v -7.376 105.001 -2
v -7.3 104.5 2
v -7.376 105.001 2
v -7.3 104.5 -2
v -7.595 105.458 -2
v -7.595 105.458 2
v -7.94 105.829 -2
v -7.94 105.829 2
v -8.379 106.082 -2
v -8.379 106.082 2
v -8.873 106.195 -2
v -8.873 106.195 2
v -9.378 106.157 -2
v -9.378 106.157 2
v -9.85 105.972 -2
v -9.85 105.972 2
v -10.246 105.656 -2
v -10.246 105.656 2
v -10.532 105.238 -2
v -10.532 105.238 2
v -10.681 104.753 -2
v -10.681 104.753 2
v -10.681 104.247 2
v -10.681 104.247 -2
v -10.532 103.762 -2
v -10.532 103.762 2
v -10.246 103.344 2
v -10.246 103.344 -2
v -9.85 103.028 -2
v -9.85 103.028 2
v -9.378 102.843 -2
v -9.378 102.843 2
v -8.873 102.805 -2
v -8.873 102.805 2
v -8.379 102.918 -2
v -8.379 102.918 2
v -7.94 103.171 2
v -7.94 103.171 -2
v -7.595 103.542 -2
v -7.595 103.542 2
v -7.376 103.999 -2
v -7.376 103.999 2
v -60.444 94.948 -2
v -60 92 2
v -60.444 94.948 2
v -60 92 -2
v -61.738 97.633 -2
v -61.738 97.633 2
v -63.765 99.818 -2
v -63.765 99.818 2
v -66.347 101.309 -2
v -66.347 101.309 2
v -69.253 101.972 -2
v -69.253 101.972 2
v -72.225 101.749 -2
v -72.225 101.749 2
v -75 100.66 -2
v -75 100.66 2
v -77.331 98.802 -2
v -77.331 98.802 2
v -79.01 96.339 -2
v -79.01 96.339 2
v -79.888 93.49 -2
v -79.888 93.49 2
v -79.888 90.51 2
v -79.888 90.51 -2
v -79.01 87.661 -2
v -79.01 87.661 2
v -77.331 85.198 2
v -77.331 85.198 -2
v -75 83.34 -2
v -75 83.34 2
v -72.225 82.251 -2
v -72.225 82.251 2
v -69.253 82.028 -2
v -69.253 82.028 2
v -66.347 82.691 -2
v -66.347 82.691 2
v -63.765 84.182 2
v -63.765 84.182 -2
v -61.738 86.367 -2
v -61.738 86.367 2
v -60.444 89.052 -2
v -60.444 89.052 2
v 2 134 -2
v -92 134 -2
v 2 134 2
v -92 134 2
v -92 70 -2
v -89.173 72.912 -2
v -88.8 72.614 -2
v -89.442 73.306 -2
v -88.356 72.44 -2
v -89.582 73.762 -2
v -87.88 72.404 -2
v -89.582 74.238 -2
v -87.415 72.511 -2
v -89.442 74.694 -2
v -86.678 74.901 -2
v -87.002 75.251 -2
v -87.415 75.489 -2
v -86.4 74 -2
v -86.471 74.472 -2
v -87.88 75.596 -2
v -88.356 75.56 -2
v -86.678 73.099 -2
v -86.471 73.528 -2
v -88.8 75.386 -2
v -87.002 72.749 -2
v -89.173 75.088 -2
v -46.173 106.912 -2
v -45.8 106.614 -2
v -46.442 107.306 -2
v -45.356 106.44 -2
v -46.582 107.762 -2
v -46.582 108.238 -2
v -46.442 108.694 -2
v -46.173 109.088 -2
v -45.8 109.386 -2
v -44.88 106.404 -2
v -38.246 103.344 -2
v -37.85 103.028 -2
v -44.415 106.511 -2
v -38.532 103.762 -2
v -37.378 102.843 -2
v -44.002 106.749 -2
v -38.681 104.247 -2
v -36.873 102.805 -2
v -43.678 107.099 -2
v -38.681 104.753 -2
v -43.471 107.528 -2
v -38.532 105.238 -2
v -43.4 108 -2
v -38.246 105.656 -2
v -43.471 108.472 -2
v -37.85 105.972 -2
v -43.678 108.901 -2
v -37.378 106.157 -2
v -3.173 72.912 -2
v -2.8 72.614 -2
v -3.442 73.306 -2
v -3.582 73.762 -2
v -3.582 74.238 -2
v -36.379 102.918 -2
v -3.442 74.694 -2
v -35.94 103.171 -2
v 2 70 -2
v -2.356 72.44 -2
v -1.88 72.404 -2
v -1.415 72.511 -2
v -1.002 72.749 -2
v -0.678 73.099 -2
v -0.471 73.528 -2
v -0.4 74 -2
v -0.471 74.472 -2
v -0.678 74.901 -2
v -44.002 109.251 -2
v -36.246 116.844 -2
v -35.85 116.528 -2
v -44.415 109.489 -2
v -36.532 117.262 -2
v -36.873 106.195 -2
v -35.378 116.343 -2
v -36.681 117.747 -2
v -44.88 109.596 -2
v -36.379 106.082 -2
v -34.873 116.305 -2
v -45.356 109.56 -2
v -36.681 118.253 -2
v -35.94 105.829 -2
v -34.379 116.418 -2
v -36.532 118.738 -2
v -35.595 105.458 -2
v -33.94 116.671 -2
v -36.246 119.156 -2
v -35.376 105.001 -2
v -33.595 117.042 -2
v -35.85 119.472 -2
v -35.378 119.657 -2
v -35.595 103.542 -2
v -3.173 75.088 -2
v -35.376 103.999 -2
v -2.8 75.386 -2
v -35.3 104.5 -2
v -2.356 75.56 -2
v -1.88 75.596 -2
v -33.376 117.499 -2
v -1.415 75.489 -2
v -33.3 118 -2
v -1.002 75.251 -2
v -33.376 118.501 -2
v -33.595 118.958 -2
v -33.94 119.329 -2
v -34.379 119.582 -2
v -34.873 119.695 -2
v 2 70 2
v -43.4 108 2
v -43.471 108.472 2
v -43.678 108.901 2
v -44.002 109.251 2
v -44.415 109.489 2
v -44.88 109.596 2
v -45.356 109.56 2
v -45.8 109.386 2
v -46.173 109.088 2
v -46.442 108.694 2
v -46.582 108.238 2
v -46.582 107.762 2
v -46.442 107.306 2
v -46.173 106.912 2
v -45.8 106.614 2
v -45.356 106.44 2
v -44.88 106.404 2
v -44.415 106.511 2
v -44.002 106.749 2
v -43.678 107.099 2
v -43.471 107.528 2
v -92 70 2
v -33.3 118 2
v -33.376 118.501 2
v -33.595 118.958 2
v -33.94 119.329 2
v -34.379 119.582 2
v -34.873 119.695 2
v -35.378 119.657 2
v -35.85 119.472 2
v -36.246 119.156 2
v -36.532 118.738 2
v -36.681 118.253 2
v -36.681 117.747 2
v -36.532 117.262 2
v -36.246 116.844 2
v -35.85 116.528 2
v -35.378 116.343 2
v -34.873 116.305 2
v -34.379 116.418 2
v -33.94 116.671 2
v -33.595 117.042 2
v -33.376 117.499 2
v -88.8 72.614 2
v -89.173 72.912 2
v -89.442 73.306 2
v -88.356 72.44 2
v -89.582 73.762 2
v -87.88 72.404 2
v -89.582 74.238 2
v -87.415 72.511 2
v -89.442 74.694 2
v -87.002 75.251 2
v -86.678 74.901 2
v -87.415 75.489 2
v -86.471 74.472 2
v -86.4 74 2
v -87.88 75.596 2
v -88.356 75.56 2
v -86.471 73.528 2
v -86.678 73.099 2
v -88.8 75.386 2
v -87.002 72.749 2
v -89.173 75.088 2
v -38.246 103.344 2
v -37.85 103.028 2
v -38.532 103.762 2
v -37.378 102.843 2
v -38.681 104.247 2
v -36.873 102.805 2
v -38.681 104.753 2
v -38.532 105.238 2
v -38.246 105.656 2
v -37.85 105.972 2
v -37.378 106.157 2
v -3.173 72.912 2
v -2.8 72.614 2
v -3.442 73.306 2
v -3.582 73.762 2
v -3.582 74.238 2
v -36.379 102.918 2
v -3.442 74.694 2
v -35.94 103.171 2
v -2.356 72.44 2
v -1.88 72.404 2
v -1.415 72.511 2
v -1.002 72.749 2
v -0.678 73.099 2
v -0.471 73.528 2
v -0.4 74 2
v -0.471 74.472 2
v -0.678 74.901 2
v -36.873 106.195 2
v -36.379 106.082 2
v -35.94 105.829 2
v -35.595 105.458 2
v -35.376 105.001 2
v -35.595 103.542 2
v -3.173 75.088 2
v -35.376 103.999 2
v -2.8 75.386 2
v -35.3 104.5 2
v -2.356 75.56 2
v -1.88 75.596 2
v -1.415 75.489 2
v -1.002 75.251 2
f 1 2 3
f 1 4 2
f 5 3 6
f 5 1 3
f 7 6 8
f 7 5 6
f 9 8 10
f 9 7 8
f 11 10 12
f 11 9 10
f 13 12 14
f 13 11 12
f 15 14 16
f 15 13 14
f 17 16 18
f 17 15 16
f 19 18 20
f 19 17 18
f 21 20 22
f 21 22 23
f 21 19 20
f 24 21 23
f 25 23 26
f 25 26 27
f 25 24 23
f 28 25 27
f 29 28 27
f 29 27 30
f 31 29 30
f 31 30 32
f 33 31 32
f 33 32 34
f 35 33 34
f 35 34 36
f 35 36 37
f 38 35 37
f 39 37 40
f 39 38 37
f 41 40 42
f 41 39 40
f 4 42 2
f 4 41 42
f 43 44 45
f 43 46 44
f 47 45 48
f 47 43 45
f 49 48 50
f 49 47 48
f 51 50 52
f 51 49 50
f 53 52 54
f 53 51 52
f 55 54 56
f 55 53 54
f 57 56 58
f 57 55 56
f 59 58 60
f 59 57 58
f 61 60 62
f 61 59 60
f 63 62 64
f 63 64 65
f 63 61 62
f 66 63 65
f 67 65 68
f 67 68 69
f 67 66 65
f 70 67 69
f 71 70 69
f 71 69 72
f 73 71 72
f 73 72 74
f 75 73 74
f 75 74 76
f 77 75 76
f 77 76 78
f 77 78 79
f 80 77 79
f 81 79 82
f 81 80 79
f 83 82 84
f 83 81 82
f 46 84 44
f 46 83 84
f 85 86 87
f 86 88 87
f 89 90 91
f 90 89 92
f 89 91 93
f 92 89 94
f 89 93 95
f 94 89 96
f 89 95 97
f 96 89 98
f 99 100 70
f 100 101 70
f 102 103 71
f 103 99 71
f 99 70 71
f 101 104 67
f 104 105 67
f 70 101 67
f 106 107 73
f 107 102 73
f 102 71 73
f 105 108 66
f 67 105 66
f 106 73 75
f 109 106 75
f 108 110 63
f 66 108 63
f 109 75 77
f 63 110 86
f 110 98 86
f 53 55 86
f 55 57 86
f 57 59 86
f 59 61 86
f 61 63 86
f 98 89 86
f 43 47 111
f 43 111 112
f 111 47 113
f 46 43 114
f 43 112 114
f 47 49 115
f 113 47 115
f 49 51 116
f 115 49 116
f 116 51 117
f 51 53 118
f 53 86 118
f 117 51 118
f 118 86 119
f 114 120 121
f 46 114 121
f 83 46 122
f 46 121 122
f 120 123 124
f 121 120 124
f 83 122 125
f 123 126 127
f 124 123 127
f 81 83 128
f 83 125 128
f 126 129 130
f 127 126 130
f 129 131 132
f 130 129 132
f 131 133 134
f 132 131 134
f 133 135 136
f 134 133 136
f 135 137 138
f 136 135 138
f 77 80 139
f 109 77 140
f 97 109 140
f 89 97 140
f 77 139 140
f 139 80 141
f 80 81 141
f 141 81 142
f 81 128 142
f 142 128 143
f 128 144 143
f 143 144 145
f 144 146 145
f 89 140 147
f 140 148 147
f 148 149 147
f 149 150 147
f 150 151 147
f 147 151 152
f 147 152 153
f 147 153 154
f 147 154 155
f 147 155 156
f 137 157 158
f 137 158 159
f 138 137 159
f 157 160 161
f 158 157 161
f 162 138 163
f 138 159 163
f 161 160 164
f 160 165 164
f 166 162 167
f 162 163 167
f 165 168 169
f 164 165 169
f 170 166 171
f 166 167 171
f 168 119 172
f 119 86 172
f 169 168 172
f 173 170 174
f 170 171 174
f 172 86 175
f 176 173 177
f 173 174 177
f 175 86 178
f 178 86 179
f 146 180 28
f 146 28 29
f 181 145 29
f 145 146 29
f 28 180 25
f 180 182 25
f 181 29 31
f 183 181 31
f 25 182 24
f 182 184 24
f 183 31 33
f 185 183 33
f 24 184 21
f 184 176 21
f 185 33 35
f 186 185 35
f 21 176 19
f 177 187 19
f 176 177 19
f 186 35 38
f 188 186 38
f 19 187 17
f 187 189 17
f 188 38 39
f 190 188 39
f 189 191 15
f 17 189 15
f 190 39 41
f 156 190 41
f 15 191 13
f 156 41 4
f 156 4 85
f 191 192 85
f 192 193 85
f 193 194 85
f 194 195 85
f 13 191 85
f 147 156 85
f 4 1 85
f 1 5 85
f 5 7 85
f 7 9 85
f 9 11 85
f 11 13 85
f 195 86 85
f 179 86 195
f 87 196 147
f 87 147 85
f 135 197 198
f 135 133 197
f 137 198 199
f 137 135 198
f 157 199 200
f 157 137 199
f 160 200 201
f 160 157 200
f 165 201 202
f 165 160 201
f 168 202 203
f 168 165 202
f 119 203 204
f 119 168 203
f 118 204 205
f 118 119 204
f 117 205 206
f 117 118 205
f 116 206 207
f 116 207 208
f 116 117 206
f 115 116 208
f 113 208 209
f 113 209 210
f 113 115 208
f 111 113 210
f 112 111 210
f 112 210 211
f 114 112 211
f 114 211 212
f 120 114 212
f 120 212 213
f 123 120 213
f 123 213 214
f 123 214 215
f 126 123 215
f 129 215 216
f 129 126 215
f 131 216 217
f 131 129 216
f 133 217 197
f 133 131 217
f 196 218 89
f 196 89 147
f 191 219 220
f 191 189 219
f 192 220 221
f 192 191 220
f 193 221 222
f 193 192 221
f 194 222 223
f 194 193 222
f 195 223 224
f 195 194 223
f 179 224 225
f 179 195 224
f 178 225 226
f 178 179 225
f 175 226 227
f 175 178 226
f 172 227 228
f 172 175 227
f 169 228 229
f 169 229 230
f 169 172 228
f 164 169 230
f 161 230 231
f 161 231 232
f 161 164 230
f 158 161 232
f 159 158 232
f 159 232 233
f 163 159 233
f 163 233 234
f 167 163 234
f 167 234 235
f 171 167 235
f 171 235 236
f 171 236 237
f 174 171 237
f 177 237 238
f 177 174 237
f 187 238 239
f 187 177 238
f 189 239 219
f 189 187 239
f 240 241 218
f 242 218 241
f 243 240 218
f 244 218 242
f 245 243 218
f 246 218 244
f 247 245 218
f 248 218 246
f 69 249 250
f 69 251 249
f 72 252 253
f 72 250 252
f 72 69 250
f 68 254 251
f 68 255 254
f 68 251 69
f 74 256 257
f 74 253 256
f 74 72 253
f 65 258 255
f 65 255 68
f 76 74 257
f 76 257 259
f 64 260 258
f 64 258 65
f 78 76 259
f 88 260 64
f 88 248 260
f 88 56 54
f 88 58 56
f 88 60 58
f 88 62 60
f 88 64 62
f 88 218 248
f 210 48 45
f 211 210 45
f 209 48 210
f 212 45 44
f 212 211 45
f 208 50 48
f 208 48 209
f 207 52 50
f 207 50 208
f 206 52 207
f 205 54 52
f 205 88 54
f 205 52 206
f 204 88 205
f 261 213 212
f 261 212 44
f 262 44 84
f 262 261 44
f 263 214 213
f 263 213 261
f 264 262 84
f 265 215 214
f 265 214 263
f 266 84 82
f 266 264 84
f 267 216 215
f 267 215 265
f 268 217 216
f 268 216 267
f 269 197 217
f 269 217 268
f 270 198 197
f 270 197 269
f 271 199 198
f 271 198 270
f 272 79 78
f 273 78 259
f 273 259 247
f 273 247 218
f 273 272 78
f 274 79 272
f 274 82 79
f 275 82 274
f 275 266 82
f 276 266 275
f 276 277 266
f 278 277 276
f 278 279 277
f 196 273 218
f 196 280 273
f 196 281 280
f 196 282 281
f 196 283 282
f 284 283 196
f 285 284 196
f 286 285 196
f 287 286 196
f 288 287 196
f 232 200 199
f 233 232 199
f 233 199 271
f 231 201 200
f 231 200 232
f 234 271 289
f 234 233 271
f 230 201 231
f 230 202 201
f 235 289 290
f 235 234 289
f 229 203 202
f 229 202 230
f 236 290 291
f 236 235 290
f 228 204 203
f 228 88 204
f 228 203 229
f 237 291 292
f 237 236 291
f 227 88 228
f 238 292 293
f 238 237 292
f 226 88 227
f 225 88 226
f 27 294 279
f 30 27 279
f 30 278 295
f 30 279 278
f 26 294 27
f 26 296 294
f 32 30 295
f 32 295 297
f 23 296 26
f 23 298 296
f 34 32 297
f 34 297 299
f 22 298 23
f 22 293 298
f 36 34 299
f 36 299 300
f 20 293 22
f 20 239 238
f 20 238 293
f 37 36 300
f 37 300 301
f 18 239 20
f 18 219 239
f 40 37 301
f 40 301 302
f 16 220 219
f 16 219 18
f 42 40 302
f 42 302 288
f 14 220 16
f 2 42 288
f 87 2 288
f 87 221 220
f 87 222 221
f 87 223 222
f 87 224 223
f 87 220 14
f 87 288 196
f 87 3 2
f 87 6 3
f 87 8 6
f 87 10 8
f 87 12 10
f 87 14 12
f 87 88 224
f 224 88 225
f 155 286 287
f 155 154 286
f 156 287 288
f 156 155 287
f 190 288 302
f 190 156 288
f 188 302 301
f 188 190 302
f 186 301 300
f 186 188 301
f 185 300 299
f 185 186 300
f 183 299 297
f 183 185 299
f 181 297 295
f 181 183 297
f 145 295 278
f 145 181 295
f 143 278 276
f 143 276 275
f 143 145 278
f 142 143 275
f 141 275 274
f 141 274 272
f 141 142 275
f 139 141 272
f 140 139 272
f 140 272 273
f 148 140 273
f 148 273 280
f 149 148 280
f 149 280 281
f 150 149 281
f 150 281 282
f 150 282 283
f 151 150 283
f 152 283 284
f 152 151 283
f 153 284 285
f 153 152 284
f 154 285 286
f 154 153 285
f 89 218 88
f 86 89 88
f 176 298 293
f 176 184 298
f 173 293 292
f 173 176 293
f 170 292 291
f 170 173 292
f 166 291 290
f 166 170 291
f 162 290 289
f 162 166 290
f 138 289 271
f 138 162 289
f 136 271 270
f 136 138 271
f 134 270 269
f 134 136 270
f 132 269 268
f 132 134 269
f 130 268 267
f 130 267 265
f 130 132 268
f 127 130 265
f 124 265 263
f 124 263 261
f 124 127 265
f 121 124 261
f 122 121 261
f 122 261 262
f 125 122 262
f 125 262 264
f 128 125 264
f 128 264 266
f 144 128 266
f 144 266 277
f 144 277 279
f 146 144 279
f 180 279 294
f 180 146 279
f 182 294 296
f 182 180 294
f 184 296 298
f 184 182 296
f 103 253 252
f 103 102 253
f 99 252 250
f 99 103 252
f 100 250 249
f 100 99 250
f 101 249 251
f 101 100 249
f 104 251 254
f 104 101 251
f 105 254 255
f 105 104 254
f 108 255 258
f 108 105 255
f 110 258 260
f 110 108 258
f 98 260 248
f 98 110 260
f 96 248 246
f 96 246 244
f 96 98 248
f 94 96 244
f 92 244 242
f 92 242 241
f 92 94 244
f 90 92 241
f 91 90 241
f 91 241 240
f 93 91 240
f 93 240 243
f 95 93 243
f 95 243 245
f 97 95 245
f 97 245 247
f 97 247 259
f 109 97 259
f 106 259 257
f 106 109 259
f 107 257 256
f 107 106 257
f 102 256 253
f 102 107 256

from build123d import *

# Parameters (mm, degrees)
SKETCH_1_W      = 94
SKETCH_1_H      = 64
SKETCH_1_R      = 10
SKETCH_1_R_2    = 1.7
SKETCH_1_R_3    = 1.6
EXTRUDE_1_DEPTH = 2


with BuildPart() as part:
    # 草图1 → 凸台-拉伸1 (new, symmetric)
    with BuildSketch(Plane.XY):
        with Locations((-45, 102)):
            Rectangle(SKETCH_1_W, SKETCH_1_H)
        with Locations((-70, 92)):
            Circle(SKETCH_1_R, mode=Mode.SUBTRACT)
        with Locations((-35, 118)):
            Circle(SKETCH_1_R_2, mode=Mode.SUBTRACT)
        with Locations((-9, 104.5)):
            Circle(SKETCH_1_R_2, mode=Mode.SUBTRACT)
        with Locations((-37, 104.5)):
            Circle(SKETCH_1_R_2, mode=Mode.SUBTRACT)
        with Locations((-88, 74)):
            Circle(SKETCH_1_R_3, mode=Mode.SUBTRACT)
        with Locations((-2, 74)):
            Circle(SKETCH_1_R_3, mode=Mode.SUBTRACT)
        with Locations((-45, 108)):
            Circle(SKETCH_1_R_3, mode=Mode.SUBTRACT)
    extrude(amount=EXTRUDE_1_DEPTH, both=True)


solid = part.part
